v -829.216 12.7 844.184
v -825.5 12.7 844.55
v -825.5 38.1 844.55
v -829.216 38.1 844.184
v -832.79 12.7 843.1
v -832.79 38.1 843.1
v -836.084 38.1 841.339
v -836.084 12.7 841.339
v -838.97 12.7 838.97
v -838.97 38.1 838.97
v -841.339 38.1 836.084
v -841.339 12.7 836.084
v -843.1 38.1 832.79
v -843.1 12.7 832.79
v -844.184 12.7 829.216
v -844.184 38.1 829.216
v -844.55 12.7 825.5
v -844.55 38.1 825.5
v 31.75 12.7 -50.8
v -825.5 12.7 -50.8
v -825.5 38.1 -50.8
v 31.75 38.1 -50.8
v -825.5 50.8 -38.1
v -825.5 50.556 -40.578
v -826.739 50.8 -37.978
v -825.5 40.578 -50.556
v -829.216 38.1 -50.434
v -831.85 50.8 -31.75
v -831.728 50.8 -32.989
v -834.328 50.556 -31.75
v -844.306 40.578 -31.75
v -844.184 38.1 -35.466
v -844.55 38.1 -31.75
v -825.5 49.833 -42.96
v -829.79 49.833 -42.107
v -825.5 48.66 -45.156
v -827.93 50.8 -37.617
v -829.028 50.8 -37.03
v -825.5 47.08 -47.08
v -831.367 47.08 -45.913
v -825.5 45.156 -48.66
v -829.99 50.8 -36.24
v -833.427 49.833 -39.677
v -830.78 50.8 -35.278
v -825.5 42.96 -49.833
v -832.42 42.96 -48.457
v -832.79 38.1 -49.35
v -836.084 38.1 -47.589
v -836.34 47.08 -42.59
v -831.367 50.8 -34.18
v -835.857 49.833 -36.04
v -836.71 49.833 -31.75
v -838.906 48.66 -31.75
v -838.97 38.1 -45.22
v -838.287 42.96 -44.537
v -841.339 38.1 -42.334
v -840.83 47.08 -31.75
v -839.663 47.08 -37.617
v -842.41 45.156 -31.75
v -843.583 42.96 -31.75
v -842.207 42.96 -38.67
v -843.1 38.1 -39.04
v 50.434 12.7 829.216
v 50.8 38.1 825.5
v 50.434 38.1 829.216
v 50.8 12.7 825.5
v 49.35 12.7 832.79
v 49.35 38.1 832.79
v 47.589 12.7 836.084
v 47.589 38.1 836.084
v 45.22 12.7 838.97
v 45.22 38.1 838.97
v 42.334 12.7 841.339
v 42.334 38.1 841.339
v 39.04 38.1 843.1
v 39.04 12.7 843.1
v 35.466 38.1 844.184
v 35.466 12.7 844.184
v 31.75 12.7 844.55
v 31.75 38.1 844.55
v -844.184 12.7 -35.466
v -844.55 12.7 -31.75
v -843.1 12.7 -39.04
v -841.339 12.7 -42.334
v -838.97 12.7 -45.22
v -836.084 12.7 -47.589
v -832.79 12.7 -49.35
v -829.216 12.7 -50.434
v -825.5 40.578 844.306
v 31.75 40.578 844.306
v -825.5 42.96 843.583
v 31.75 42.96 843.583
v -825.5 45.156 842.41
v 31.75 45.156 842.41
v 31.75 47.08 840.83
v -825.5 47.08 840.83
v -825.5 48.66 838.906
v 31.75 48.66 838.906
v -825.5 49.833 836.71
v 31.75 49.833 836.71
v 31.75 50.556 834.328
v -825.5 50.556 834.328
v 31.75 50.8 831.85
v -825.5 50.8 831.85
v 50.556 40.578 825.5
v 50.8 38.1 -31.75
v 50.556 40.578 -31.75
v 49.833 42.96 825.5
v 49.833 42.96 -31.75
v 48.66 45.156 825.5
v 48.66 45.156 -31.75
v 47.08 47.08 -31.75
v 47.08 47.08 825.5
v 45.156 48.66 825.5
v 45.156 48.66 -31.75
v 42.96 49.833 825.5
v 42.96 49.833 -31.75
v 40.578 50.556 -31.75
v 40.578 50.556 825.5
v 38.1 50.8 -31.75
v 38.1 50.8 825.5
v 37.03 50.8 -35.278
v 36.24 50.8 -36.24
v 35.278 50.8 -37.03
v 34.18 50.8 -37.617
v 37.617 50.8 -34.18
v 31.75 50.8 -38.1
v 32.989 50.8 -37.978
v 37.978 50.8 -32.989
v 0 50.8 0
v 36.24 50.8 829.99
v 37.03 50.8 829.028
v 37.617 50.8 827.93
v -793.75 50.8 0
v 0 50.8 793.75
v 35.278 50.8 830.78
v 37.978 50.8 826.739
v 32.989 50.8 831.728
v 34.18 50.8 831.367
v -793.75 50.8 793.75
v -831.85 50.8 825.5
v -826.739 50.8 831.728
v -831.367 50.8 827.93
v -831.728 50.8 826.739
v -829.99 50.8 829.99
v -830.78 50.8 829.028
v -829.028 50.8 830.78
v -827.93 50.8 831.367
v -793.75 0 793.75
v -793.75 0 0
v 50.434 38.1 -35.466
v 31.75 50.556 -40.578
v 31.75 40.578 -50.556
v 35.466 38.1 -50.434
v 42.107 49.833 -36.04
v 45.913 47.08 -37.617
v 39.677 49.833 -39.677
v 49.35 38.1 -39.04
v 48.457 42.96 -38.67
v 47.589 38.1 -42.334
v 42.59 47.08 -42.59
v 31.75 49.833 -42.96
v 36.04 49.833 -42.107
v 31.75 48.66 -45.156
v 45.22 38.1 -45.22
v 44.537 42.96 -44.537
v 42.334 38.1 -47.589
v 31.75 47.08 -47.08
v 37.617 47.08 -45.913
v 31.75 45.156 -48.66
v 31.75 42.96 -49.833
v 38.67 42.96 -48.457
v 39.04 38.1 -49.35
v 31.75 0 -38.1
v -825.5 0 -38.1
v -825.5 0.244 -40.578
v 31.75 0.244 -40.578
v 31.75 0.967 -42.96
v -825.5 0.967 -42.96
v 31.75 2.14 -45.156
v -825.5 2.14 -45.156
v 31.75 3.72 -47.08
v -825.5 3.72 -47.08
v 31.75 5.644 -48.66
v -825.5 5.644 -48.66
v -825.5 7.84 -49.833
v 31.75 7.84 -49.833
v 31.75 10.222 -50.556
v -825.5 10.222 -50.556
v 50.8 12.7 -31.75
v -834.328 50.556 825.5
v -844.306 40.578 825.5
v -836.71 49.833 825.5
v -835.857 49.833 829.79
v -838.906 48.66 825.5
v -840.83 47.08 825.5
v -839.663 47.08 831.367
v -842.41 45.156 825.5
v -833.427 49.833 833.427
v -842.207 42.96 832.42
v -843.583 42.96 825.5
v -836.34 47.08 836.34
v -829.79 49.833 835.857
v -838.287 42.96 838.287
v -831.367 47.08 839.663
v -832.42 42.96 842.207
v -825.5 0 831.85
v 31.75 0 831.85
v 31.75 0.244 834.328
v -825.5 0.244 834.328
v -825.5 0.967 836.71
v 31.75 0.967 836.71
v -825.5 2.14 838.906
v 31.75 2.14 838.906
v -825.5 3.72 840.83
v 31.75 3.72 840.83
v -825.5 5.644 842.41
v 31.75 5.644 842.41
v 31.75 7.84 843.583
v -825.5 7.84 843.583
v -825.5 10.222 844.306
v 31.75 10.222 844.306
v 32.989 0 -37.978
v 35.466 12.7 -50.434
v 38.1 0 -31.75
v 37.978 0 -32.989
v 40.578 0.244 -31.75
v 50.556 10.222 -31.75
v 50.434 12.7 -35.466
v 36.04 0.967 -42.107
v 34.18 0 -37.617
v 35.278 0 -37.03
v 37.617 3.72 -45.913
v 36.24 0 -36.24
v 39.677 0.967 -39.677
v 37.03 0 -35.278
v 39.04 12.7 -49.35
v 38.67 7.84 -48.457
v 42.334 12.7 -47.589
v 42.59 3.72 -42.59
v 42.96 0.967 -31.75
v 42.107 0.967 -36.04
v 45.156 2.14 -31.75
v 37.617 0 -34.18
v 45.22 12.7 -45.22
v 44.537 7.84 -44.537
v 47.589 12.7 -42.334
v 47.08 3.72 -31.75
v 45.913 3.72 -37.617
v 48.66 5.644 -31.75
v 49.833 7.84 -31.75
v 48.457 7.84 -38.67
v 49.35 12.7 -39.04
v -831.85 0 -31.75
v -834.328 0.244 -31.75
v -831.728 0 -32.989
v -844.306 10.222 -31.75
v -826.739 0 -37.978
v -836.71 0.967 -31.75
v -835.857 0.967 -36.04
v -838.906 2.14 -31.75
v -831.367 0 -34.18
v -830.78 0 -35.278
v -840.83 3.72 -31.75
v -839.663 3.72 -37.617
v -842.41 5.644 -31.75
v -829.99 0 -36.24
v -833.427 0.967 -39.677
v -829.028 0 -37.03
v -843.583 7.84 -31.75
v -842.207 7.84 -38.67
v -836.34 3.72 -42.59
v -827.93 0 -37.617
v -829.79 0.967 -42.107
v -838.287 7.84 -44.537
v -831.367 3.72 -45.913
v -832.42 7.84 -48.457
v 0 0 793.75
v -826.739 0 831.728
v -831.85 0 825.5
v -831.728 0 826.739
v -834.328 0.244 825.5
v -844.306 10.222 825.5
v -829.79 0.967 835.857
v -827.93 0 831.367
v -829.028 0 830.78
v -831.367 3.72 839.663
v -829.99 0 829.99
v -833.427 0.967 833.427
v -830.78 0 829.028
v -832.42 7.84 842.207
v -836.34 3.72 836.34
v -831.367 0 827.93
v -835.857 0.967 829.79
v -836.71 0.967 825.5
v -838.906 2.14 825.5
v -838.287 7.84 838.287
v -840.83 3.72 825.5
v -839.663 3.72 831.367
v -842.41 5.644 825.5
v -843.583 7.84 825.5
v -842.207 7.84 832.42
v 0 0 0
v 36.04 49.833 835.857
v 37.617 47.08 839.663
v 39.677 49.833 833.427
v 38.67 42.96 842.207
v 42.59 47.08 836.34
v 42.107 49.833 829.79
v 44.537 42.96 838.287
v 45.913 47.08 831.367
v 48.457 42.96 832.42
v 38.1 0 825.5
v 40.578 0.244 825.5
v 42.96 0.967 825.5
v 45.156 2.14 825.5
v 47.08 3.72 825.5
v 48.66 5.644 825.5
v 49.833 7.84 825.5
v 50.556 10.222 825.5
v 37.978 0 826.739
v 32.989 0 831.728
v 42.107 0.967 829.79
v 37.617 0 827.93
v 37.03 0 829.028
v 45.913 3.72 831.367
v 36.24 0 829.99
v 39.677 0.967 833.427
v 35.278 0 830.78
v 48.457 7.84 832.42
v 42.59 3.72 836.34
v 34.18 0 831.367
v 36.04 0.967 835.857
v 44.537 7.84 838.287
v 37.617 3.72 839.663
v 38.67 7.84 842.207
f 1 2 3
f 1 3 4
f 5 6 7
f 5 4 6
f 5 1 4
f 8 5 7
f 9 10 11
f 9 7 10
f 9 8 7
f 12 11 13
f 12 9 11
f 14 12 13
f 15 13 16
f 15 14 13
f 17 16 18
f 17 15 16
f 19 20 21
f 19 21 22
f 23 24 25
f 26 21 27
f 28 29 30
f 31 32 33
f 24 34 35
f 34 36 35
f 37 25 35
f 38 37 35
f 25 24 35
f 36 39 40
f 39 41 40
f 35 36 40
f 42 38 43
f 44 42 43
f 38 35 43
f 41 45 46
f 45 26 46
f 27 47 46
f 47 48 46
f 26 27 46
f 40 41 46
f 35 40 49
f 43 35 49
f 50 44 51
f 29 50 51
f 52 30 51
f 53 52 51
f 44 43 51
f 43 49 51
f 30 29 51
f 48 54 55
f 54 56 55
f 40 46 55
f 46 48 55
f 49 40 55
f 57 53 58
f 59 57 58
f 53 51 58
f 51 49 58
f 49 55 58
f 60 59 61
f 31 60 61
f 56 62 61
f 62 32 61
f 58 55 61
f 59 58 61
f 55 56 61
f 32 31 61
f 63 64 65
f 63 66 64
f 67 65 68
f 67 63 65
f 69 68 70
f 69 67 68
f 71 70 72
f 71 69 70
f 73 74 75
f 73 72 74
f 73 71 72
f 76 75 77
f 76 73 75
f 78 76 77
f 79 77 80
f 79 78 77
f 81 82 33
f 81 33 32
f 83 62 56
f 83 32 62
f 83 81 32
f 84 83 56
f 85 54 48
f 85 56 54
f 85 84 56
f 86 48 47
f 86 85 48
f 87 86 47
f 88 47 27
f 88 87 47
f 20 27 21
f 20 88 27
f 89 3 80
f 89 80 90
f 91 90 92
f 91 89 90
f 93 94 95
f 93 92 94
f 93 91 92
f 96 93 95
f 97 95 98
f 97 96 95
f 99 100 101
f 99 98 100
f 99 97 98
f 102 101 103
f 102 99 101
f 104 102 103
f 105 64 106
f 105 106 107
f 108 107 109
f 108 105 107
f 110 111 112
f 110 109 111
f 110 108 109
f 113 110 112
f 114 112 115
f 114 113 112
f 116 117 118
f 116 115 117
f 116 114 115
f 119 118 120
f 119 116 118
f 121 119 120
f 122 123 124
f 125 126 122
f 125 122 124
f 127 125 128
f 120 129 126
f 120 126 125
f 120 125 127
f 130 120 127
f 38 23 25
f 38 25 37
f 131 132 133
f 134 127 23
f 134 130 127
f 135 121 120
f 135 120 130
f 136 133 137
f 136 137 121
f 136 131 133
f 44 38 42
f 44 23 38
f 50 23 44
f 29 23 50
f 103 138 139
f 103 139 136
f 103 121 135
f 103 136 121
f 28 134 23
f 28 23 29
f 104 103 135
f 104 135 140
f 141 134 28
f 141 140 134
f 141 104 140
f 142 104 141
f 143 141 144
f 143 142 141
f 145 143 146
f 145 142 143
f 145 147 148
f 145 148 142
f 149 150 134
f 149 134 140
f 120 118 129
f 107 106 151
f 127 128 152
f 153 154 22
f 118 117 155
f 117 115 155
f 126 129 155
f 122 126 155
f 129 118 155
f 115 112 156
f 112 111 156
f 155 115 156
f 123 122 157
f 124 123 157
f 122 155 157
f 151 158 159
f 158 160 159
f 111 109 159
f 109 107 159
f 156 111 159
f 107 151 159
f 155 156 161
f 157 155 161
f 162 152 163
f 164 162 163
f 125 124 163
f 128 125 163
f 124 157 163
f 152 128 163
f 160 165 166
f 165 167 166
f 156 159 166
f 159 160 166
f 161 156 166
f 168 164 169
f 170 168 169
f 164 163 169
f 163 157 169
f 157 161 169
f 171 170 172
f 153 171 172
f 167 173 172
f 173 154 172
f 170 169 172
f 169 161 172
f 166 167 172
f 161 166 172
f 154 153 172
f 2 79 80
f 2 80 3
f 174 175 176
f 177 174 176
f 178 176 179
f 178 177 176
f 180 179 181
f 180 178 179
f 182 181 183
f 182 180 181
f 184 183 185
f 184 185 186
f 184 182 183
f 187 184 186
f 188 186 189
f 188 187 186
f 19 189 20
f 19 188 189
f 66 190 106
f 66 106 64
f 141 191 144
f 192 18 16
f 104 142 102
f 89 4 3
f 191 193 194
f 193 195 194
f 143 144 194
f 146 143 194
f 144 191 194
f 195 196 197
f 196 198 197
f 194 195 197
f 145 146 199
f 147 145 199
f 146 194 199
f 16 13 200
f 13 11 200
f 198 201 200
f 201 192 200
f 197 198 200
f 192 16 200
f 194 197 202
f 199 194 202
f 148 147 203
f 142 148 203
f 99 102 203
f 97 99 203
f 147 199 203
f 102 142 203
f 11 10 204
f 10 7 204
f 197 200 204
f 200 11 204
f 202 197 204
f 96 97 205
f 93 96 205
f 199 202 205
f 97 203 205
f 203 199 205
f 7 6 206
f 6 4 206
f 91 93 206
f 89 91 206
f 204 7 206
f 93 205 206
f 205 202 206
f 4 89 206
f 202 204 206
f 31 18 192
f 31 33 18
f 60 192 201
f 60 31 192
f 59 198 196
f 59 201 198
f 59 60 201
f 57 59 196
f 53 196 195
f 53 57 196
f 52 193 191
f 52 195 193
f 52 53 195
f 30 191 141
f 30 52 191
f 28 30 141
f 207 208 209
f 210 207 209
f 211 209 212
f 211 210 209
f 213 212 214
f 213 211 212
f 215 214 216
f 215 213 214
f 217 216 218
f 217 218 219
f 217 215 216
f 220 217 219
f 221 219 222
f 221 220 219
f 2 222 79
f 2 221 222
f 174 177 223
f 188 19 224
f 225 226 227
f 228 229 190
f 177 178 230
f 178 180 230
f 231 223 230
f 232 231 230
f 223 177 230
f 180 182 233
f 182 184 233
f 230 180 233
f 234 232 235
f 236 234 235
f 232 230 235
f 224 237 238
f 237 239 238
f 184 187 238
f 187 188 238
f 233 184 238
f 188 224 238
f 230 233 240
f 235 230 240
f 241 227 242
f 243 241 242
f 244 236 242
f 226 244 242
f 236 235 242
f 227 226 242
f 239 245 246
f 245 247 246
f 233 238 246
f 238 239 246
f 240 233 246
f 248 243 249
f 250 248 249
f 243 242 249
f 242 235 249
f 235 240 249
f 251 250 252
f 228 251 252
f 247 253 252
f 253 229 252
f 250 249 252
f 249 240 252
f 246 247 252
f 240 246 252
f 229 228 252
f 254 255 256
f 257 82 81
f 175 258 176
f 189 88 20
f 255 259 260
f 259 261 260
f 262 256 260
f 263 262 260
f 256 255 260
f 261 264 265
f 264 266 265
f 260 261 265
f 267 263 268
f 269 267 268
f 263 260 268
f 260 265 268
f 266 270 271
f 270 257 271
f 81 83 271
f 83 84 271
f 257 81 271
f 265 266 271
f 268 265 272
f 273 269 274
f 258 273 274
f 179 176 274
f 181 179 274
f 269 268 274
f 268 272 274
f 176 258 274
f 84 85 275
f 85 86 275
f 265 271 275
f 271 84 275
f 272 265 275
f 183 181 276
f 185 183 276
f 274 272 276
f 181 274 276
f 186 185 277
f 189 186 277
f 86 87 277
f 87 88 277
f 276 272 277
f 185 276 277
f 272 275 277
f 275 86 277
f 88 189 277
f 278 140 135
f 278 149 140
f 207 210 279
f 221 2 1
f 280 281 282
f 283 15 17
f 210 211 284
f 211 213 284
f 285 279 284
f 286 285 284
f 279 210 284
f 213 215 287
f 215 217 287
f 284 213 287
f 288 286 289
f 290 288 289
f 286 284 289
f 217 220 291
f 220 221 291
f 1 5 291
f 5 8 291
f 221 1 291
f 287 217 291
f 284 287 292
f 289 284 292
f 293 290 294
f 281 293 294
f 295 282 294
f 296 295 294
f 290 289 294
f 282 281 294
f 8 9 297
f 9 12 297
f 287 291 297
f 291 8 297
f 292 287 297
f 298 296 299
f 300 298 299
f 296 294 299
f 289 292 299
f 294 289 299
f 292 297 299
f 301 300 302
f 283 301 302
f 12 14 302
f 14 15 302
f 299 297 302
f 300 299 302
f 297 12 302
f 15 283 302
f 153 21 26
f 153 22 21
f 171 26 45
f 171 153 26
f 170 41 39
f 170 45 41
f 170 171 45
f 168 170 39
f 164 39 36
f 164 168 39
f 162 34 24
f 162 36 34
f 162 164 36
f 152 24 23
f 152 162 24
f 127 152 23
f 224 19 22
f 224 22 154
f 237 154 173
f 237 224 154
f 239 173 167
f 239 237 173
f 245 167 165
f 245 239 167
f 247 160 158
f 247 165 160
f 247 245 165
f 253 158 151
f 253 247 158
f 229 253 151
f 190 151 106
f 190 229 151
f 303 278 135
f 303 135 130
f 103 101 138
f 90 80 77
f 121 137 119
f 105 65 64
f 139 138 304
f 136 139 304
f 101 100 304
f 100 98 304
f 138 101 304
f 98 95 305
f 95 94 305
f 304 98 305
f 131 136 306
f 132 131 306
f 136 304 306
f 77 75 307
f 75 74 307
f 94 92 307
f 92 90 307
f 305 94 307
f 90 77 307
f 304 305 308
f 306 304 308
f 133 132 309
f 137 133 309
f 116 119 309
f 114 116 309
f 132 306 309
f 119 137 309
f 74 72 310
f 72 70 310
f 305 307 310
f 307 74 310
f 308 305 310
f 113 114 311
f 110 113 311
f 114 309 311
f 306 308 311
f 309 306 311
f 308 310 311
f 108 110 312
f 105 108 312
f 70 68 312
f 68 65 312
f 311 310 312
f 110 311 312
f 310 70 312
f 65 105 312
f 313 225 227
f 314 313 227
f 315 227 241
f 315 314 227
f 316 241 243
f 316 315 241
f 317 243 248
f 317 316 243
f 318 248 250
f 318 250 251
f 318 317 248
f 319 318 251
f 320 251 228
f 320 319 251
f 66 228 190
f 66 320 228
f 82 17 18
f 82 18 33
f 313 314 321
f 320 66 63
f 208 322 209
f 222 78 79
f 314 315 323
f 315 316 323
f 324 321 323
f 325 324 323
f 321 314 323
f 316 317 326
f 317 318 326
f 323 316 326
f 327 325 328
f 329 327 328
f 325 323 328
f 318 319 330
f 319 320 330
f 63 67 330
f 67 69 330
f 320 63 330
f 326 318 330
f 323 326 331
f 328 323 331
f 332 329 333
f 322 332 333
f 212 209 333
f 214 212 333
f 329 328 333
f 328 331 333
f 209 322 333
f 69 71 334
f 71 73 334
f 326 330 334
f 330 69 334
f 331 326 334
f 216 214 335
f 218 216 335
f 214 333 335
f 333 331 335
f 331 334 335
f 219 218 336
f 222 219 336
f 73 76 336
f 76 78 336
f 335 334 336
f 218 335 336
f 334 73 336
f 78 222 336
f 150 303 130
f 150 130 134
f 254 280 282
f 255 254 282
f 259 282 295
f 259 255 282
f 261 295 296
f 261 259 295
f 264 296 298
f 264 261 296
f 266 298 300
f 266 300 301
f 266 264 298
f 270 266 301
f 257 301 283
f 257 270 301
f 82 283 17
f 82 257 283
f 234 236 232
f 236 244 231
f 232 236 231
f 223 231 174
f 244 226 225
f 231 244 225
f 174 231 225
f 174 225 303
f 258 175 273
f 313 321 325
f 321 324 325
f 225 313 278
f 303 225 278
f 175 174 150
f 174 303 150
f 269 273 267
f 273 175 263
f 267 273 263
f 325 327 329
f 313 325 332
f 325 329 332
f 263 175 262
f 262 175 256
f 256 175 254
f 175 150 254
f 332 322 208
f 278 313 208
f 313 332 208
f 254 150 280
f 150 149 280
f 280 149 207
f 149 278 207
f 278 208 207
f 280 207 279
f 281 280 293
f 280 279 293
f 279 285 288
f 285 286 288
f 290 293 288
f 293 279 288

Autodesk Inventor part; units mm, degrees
ref_plane "YZ Plane" through (0, 0, 0) normal (1, 0, 0) x (0, 1, 0)
ref_plane "XZ Plane" through (0, 0, 0) normal (0, 1, 0) x (-1, 0, 0)
ref_plane "XY Plane" through (0, 0, 0) normal (0, 0, 1) x (1, 0, 0)
sketch "Sketch1" plane through (0, 0, 0) normal (0, 1, 0) x (-1, 0, 0)
  line L0 (0, 0) -> (793.75, 0)
  line L1 (793.75, 0) -> (793.75, 793.75)
  line L2 (793.75, 793.75) -> (0, 793.75)
  line L3 (0, 793.75) -> (0, 0)
  line L4 (0, 793.75) -> (793.75, 0) construction
  line L5 (793.75, 793.75) -> (0, 0) construction
  line L6 (844.55, -50.8) -> (-50.8, -50.8)
  line L7 (-50.8, -50.8) -> (-50.8, 844.55)
  line L8 (-50.8, 844.55) -> (844.55, 844.55)
  line L9 (844.55, 844.55) -> (844.55, -50.8)
  line L10 (844.55, -50.8) -> (-50.8, 844.55) construction
  line L11 (-50.8, -50.8) -> (844.55, 844.55) construction
  point P0 (396.875, 396.875)
  dimension "d0" = 793.75
  dimension "d1" = 50.8
  dimension "d2" = 50.8
extrude "Extrusion1" add sketch "Sketch1" along normal blind 50.8
fillet "Fillet1" radius 12.7 8 edges at (-396.875, 50.8, 844.55) (-844.55, 50.8, 396.875) (-396.875, 50.8, -50.8) (50.8, 50.8, 396.875) (-396.875, 0, 844.55) (50.8, 0, 396.875) (-396.875, 0, -50.8) (-844.55, 0, 396.875)
fillet "Fillet2" radius 19.05 12 edges at (47.0803, 47.0803, -47.0803) (47.0803, 3.7197, -47.0803) (50.8, 25.4, -50.8) (47.0803, 47.0803, 840.8303) (47.0803, 3.7197, 840.8303) (50.8, 25.4, 844.55) (-840.8303, 47.0803, 840.8303) (-840.8303, 3.7197, 840.8303) (-844.55, 25.4, 844.55) (-840.8303, 47.0803, -47.0803) (-840.8303, 3.7197, -47.0803) (-844.55, 25.4, -50.8)
properties part number "200555"
